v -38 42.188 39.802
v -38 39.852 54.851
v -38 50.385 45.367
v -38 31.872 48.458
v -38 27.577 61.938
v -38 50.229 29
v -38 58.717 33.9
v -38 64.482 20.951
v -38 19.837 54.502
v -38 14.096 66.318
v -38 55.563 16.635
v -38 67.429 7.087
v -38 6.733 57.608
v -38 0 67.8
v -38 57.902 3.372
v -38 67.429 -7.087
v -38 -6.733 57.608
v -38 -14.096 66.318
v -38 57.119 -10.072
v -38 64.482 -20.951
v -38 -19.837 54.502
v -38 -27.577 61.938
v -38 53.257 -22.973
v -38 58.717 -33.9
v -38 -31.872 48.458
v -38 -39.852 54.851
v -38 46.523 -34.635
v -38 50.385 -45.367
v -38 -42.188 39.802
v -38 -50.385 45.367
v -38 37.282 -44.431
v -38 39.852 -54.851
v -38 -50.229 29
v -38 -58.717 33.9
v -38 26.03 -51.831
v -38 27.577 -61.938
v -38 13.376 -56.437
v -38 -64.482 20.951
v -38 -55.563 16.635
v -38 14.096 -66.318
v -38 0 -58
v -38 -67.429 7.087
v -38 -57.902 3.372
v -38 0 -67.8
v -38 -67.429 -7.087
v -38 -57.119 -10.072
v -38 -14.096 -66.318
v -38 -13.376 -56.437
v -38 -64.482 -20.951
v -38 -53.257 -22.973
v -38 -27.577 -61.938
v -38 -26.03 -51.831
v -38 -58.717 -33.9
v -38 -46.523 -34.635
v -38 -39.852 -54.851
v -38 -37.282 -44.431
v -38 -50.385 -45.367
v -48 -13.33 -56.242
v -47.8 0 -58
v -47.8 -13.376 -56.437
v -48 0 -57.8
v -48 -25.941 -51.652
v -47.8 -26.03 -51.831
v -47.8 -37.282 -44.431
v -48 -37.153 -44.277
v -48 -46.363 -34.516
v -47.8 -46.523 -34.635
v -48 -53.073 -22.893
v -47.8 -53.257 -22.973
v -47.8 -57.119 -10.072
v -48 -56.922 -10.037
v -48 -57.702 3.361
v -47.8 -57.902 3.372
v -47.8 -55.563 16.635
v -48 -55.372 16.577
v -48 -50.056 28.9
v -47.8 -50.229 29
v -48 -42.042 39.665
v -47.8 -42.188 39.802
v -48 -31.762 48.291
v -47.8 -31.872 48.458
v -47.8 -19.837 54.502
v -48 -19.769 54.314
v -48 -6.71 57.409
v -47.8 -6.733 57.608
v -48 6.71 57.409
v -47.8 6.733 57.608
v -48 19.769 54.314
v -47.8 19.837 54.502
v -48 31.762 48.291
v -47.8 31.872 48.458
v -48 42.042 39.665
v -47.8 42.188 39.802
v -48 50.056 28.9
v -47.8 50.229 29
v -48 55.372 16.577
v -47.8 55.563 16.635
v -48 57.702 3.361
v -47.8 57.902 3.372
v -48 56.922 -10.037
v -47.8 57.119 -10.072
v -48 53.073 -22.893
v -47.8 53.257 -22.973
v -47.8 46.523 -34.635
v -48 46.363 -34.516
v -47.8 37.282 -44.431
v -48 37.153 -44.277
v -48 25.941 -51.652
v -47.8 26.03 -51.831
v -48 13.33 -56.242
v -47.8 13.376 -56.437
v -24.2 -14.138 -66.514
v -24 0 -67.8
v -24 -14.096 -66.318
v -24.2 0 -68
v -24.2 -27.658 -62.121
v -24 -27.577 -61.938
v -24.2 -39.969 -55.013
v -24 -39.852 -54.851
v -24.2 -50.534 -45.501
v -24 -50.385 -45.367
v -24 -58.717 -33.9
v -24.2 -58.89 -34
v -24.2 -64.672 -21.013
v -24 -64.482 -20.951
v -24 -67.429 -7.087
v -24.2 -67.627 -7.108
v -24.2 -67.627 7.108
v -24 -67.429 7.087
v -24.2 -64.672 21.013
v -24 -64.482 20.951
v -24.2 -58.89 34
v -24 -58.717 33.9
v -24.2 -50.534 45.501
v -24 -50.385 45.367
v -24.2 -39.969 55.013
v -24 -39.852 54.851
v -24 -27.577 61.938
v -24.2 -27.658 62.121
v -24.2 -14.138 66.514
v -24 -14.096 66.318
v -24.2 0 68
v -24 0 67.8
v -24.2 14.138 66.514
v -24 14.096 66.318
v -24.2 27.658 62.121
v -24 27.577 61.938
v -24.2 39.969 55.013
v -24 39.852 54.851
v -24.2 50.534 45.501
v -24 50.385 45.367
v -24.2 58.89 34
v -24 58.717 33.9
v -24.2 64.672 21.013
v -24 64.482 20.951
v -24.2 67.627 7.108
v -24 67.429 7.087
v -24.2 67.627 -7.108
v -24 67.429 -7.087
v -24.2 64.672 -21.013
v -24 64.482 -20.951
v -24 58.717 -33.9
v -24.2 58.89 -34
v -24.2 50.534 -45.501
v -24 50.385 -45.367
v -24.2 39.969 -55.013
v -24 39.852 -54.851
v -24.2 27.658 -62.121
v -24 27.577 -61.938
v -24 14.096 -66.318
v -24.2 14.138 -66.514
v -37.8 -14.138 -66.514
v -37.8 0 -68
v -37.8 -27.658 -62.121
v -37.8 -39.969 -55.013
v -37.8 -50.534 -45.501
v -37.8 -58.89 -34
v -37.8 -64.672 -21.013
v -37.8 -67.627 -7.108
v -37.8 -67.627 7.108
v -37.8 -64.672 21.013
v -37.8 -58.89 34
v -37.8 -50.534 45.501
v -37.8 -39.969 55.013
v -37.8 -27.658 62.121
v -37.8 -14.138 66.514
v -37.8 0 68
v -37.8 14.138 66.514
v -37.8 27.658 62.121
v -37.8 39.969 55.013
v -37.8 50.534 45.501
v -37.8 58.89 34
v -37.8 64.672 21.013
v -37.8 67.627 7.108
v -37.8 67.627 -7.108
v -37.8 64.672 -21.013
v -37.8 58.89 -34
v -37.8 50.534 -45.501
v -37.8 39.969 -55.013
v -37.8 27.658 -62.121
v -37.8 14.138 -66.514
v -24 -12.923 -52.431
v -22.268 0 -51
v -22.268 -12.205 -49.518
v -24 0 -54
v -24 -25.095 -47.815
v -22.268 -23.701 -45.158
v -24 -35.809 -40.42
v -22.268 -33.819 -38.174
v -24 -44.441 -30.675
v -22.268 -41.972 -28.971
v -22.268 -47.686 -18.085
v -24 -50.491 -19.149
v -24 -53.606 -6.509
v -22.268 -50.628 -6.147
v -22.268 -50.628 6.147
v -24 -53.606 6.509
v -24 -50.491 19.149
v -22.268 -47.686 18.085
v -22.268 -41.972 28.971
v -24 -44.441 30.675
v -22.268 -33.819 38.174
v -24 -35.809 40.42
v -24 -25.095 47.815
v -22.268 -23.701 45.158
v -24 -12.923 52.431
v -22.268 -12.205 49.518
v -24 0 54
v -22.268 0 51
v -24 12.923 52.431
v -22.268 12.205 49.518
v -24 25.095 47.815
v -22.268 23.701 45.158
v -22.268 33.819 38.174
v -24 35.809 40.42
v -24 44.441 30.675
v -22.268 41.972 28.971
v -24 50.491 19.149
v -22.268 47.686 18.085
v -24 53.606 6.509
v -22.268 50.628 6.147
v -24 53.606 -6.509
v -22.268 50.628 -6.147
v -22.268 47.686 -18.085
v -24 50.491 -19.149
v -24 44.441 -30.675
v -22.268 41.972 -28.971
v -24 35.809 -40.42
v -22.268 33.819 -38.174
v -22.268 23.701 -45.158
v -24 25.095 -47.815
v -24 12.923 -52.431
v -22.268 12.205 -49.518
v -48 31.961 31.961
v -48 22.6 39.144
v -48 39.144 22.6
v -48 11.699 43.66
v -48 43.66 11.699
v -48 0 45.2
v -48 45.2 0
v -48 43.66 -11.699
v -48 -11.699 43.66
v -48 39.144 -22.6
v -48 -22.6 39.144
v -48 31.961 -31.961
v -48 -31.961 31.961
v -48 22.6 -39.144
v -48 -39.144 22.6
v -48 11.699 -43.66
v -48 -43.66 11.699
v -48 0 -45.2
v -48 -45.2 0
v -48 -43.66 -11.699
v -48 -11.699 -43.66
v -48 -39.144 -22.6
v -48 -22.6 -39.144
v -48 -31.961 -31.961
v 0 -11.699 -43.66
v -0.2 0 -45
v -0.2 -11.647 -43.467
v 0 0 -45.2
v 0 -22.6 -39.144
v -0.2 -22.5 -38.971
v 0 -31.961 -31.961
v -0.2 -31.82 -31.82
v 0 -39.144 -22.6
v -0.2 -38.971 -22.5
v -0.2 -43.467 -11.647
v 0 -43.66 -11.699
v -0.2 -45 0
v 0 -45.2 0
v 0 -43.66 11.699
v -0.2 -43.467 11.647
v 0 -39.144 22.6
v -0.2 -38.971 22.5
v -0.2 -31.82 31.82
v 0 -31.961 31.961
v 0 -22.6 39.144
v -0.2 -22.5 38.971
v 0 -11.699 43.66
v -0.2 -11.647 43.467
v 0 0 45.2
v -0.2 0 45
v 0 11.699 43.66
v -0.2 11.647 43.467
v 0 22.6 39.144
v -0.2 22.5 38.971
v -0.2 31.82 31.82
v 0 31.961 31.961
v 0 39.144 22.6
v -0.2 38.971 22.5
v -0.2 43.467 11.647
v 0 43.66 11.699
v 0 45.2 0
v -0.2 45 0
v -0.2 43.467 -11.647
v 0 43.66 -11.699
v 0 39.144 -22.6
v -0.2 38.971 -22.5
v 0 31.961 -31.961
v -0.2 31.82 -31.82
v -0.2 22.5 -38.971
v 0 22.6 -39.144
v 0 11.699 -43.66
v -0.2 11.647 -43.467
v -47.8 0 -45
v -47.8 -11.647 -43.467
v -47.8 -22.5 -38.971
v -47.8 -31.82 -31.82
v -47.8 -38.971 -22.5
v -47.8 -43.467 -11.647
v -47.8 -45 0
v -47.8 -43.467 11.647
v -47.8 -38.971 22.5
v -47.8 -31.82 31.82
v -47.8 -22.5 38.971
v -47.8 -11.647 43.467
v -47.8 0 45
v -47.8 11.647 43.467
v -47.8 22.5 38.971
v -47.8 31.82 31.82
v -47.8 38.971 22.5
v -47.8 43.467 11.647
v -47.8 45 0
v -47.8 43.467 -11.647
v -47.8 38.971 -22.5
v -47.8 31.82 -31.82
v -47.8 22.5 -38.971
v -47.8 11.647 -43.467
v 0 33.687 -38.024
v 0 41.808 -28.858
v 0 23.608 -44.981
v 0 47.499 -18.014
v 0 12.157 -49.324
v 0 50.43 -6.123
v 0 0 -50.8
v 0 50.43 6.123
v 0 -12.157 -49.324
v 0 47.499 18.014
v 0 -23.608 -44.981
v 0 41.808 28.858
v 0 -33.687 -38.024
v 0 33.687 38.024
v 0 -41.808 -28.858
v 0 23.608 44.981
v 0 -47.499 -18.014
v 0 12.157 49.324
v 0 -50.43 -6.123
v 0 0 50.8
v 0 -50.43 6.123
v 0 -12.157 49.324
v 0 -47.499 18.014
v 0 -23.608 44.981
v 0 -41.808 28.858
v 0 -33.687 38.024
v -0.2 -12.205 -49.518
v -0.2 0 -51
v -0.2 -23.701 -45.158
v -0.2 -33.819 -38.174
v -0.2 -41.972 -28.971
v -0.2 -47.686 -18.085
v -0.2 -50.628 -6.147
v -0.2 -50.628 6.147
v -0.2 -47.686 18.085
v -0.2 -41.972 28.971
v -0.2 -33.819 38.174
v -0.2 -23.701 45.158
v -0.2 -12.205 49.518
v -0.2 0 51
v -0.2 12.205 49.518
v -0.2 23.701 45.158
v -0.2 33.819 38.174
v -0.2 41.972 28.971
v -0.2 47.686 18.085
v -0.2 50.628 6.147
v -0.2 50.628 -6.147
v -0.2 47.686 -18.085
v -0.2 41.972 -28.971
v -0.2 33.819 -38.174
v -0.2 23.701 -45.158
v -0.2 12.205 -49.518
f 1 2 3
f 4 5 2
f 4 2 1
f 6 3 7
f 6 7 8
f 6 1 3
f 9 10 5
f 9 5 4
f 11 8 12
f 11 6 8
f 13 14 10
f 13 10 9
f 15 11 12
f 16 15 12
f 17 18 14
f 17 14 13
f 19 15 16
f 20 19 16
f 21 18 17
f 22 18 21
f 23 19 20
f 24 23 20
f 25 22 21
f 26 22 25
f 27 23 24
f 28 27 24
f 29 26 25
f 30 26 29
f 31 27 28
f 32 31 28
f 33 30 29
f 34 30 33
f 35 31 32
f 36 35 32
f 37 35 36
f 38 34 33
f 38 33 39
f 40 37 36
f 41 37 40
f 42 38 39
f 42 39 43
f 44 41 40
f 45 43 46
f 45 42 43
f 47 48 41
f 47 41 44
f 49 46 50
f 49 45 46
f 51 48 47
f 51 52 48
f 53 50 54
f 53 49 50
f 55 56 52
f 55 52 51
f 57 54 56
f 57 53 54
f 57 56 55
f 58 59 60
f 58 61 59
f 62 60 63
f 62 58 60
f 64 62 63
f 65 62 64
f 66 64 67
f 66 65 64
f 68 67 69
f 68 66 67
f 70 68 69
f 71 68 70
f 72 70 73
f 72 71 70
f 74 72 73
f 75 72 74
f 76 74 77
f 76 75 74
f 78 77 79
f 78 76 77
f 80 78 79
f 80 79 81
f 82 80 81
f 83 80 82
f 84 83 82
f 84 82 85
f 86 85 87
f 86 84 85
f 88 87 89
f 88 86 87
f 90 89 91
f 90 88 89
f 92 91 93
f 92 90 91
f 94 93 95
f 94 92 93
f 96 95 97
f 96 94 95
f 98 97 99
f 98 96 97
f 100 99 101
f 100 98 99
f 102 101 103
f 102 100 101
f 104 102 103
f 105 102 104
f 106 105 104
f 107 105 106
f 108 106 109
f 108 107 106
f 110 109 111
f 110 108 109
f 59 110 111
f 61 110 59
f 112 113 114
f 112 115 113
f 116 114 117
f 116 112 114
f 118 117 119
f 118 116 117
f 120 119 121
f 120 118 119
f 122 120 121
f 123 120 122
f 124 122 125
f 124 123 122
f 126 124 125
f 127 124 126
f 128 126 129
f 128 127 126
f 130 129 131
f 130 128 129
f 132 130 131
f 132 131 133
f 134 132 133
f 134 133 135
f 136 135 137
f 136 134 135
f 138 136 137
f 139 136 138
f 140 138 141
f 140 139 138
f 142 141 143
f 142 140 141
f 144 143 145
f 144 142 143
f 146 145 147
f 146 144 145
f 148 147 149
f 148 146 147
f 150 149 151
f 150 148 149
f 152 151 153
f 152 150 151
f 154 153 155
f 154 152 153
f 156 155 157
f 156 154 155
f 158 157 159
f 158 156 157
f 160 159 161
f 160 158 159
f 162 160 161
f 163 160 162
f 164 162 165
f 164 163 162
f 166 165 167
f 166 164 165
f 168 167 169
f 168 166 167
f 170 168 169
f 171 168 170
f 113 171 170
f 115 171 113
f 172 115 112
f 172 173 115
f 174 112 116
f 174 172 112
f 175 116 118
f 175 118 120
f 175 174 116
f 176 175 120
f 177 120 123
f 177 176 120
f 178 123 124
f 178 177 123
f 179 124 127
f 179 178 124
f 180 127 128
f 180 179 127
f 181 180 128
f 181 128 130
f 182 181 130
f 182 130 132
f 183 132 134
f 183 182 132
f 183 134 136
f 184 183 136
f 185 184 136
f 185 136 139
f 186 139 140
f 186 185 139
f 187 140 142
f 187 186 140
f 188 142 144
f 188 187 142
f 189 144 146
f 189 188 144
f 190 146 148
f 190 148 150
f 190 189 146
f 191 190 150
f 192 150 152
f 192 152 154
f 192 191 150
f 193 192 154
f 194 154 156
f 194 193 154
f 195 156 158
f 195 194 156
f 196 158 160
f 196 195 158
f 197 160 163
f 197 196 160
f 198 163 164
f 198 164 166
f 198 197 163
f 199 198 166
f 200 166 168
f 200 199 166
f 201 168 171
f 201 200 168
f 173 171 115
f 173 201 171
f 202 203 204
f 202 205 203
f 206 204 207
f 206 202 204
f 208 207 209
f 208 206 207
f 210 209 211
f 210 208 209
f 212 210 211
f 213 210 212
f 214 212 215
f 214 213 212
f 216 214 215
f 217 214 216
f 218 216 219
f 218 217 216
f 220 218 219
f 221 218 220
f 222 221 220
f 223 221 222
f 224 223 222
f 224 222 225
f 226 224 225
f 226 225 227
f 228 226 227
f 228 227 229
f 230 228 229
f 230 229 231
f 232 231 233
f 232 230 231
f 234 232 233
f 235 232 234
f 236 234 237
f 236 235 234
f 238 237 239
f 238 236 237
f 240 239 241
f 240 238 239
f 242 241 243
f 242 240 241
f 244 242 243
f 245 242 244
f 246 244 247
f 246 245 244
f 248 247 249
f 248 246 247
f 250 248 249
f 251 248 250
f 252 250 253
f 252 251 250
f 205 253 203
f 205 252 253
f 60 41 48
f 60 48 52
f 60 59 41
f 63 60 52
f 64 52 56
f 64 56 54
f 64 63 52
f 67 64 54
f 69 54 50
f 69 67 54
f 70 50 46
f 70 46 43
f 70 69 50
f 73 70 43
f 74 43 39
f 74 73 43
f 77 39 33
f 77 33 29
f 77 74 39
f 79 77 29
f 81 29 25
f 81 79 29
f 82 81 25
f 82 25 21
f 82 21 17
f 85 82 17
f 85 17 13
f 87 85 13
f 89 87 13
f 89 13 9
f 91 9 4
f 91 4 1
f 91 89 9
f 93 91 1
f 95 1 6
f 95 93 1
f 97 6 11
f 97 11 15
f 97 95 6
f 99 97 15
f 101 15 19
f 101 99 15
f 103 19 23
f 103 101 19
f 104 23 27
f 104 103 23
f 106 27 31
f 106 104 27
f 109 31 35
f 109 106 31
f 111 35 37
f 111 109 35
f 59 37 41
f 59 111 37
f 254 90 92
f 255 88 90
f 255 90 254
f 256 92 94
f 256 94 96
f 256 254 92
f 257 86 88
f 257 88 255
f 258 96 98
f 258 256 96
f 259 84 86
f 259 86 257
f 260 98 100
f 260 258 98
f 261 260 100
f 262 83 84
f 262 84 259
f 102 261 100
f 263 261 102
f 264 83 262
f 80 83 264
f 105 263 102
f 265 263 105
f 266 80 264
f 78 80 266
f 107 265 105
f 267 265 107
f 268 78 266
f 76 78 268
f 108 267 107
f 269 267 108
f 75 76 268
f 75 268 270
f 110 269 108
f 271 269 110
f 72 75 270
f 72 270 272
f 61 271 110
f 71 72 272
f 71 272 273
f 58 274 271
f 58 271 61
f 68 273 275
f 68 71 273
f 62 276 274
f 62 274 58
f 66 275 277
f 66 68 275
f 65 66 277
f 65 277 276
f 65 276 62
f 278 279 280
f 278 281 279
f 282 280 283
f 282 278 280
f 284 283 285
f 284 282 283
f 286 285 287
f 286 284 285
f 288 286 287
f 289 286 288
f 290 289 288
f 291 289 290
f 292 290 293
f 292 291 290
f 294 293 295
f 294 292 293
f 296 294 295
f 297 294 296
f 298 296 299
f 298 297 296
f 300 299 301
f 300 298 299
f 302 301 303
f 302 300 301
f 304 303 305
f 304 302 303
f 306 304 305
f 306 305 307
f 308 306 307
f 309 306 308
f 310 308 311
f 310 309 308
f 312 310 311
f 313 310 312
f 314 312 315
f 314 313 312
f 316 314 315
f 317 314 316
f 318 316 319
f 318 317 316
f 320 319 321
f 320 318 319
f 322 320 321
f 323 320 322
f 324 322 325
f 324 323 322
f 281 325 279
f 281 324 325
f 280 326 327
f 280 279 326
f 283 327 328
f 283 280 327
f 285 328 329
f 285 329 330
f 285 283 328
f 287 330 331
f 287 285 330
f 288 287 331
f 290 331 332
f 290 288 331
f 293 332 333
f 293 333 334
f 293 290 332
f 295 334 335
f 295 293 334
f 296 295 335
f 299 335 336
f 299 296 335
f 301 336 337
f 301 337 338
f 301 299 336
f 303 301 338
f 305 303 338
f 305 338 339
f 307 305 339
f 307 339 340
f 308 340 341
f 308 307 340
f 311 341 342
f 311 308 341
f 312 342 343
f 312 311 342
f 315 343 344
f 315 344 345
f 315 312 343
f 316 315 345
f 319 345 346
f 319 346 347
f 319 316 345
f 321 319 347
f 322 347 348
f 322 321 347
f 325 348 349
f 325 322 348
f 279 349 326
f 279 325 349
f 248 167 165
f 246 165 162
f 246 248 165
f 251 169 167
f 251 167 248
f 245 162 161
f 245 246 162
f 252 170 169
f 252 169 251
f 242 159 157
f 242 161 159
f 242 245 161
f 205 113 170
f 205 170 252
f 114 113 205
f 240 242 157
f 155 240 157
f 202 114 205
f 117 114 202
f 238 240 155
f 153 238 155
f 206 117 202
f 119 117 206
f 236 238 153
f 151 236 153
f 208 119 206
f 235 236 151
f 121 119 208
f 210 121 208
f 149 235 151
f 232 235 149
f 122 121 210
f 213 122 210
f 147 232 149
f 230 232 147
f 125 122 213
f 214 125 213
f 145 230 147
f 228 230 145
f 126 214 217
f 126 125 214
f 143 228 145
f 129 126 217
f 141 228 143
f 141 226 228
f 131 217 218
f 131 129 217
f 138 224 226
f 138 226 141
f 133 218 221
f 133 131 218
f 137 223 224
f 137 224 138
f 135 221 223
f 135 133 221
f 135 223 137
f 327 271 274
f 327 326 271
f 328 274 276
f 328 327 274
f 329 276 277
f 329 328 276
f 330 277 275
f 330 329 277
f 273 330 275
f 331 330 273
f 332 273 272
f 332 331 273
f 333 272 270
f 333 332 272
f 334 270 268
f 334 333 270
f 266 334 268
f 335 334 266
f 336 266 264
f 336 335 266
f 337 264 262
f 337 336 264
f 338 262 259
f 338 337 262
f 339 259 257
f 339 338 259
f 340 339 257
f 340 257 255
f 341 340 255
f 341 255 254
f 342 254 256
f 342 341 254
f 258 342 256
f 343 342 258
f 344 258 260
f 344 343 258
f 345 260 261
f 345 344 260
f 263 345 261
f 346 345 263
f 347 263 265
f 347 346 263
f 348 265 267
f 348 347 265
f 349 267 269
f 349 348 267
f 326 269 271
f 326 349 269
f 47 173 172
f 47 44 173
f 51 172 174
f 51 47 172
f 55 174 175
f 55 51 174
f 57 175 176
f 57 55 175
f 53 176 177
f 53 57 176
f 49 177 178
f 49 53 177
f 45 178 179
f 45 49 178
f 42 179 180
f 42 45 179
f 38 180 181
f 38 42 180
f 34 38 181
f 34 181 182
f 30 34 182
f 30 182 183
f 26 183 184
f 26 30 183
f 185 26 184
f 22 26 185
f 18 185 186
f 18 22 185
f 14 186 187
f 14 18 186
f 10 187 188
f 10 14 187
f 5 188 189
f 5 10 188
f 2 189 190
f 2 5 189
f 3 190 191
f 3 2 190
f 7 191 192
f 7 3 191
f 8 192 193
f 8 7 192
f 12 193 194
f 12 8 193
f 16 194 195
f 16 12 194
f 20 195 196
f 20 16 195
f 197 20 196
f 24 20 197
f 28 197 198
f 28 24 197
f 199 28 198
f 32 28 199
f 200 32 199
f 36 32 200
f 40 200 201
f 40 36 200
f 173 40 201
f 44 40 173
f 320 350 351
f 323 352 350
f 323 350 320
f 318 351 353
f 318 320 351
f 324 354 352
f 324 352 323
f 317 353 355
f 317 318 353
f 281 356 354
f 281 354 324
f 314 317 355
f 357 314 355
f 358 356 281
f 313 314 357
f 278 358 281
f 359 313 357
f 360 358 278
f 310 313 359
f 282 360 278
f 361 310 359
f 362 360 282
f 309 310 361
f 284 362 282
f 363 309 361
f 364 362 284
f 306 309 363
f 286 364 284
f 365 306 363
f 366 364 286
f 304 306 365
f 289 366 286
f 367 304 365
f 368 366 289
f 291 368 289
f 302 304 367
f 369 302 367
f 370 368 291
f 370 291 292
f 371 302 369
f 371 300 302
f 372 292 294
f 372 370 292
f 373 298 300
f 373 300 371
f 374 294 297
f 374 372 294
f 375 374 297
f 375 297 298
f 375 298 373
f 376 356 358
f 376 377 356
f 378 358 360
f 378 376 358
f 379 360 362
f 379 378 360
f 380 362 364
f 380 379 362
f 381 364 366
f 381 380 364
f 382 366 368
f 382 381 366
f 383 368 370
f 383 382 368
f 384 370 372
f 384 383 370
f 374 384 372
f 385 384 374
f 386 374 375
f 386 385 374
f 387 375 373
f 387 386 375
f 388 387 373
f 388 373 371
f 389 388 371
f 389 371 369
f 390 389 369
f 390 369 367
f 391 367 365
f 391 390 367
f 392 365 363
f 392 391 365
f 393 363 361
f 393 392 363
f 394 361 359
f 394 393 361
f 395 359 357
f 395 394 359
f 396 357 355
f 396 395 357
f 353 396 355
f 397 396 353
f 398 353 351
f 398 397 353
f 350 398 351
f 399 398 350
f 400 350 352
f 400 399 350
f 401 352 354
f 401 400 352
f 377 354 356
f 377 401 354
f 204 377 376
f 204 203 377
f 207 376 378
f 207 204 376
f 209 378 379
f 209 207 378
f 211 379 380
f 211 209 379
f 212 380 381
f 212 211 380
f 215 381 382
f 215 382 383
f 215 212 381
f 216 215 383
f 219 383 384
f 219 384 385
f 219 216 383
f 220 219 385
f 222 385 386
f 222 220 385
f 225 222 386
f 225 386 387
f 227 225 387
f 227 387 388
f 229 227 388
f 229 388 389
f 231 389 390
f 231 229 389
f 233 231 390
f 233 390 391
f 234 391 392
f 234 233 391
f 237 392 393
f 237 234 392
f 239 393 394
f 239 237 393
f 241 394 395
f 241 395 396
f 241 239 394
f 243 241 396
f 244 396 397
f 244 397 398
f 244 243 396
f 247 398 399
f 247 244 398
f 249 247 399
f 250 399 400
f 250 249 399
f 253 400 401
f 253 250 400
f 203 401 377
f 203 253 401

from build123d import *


with BuildPart() as part:
    # Esquisse1 → Révolution1 (revolve)
    with BuildSketch(Plane.XY, mode=Mode.PRIVATE) as r_volution1_sk:
        Polygon((0, 45.2), (0, 50.8), (-0.2, 51), (-22.267949192, 51), (-24, 54), (-24, 67.8), (-24.2, 68), (-37.8, 68), (-38, 67.8), (-38, 58), (-47.8, 58), (-48, 57.8), (-48, 45.2), (-47.8, 45), (-0.2, 45), align=None)
    revolve(r_volution1_sk.sketch.rotate(Axis((0, 0, 0), (-1, 0, 0)), 90), axis=Axis((0, 0, 0), (-1, 0, 0)))  # turned: the seam where the file's is


solid = part.part
